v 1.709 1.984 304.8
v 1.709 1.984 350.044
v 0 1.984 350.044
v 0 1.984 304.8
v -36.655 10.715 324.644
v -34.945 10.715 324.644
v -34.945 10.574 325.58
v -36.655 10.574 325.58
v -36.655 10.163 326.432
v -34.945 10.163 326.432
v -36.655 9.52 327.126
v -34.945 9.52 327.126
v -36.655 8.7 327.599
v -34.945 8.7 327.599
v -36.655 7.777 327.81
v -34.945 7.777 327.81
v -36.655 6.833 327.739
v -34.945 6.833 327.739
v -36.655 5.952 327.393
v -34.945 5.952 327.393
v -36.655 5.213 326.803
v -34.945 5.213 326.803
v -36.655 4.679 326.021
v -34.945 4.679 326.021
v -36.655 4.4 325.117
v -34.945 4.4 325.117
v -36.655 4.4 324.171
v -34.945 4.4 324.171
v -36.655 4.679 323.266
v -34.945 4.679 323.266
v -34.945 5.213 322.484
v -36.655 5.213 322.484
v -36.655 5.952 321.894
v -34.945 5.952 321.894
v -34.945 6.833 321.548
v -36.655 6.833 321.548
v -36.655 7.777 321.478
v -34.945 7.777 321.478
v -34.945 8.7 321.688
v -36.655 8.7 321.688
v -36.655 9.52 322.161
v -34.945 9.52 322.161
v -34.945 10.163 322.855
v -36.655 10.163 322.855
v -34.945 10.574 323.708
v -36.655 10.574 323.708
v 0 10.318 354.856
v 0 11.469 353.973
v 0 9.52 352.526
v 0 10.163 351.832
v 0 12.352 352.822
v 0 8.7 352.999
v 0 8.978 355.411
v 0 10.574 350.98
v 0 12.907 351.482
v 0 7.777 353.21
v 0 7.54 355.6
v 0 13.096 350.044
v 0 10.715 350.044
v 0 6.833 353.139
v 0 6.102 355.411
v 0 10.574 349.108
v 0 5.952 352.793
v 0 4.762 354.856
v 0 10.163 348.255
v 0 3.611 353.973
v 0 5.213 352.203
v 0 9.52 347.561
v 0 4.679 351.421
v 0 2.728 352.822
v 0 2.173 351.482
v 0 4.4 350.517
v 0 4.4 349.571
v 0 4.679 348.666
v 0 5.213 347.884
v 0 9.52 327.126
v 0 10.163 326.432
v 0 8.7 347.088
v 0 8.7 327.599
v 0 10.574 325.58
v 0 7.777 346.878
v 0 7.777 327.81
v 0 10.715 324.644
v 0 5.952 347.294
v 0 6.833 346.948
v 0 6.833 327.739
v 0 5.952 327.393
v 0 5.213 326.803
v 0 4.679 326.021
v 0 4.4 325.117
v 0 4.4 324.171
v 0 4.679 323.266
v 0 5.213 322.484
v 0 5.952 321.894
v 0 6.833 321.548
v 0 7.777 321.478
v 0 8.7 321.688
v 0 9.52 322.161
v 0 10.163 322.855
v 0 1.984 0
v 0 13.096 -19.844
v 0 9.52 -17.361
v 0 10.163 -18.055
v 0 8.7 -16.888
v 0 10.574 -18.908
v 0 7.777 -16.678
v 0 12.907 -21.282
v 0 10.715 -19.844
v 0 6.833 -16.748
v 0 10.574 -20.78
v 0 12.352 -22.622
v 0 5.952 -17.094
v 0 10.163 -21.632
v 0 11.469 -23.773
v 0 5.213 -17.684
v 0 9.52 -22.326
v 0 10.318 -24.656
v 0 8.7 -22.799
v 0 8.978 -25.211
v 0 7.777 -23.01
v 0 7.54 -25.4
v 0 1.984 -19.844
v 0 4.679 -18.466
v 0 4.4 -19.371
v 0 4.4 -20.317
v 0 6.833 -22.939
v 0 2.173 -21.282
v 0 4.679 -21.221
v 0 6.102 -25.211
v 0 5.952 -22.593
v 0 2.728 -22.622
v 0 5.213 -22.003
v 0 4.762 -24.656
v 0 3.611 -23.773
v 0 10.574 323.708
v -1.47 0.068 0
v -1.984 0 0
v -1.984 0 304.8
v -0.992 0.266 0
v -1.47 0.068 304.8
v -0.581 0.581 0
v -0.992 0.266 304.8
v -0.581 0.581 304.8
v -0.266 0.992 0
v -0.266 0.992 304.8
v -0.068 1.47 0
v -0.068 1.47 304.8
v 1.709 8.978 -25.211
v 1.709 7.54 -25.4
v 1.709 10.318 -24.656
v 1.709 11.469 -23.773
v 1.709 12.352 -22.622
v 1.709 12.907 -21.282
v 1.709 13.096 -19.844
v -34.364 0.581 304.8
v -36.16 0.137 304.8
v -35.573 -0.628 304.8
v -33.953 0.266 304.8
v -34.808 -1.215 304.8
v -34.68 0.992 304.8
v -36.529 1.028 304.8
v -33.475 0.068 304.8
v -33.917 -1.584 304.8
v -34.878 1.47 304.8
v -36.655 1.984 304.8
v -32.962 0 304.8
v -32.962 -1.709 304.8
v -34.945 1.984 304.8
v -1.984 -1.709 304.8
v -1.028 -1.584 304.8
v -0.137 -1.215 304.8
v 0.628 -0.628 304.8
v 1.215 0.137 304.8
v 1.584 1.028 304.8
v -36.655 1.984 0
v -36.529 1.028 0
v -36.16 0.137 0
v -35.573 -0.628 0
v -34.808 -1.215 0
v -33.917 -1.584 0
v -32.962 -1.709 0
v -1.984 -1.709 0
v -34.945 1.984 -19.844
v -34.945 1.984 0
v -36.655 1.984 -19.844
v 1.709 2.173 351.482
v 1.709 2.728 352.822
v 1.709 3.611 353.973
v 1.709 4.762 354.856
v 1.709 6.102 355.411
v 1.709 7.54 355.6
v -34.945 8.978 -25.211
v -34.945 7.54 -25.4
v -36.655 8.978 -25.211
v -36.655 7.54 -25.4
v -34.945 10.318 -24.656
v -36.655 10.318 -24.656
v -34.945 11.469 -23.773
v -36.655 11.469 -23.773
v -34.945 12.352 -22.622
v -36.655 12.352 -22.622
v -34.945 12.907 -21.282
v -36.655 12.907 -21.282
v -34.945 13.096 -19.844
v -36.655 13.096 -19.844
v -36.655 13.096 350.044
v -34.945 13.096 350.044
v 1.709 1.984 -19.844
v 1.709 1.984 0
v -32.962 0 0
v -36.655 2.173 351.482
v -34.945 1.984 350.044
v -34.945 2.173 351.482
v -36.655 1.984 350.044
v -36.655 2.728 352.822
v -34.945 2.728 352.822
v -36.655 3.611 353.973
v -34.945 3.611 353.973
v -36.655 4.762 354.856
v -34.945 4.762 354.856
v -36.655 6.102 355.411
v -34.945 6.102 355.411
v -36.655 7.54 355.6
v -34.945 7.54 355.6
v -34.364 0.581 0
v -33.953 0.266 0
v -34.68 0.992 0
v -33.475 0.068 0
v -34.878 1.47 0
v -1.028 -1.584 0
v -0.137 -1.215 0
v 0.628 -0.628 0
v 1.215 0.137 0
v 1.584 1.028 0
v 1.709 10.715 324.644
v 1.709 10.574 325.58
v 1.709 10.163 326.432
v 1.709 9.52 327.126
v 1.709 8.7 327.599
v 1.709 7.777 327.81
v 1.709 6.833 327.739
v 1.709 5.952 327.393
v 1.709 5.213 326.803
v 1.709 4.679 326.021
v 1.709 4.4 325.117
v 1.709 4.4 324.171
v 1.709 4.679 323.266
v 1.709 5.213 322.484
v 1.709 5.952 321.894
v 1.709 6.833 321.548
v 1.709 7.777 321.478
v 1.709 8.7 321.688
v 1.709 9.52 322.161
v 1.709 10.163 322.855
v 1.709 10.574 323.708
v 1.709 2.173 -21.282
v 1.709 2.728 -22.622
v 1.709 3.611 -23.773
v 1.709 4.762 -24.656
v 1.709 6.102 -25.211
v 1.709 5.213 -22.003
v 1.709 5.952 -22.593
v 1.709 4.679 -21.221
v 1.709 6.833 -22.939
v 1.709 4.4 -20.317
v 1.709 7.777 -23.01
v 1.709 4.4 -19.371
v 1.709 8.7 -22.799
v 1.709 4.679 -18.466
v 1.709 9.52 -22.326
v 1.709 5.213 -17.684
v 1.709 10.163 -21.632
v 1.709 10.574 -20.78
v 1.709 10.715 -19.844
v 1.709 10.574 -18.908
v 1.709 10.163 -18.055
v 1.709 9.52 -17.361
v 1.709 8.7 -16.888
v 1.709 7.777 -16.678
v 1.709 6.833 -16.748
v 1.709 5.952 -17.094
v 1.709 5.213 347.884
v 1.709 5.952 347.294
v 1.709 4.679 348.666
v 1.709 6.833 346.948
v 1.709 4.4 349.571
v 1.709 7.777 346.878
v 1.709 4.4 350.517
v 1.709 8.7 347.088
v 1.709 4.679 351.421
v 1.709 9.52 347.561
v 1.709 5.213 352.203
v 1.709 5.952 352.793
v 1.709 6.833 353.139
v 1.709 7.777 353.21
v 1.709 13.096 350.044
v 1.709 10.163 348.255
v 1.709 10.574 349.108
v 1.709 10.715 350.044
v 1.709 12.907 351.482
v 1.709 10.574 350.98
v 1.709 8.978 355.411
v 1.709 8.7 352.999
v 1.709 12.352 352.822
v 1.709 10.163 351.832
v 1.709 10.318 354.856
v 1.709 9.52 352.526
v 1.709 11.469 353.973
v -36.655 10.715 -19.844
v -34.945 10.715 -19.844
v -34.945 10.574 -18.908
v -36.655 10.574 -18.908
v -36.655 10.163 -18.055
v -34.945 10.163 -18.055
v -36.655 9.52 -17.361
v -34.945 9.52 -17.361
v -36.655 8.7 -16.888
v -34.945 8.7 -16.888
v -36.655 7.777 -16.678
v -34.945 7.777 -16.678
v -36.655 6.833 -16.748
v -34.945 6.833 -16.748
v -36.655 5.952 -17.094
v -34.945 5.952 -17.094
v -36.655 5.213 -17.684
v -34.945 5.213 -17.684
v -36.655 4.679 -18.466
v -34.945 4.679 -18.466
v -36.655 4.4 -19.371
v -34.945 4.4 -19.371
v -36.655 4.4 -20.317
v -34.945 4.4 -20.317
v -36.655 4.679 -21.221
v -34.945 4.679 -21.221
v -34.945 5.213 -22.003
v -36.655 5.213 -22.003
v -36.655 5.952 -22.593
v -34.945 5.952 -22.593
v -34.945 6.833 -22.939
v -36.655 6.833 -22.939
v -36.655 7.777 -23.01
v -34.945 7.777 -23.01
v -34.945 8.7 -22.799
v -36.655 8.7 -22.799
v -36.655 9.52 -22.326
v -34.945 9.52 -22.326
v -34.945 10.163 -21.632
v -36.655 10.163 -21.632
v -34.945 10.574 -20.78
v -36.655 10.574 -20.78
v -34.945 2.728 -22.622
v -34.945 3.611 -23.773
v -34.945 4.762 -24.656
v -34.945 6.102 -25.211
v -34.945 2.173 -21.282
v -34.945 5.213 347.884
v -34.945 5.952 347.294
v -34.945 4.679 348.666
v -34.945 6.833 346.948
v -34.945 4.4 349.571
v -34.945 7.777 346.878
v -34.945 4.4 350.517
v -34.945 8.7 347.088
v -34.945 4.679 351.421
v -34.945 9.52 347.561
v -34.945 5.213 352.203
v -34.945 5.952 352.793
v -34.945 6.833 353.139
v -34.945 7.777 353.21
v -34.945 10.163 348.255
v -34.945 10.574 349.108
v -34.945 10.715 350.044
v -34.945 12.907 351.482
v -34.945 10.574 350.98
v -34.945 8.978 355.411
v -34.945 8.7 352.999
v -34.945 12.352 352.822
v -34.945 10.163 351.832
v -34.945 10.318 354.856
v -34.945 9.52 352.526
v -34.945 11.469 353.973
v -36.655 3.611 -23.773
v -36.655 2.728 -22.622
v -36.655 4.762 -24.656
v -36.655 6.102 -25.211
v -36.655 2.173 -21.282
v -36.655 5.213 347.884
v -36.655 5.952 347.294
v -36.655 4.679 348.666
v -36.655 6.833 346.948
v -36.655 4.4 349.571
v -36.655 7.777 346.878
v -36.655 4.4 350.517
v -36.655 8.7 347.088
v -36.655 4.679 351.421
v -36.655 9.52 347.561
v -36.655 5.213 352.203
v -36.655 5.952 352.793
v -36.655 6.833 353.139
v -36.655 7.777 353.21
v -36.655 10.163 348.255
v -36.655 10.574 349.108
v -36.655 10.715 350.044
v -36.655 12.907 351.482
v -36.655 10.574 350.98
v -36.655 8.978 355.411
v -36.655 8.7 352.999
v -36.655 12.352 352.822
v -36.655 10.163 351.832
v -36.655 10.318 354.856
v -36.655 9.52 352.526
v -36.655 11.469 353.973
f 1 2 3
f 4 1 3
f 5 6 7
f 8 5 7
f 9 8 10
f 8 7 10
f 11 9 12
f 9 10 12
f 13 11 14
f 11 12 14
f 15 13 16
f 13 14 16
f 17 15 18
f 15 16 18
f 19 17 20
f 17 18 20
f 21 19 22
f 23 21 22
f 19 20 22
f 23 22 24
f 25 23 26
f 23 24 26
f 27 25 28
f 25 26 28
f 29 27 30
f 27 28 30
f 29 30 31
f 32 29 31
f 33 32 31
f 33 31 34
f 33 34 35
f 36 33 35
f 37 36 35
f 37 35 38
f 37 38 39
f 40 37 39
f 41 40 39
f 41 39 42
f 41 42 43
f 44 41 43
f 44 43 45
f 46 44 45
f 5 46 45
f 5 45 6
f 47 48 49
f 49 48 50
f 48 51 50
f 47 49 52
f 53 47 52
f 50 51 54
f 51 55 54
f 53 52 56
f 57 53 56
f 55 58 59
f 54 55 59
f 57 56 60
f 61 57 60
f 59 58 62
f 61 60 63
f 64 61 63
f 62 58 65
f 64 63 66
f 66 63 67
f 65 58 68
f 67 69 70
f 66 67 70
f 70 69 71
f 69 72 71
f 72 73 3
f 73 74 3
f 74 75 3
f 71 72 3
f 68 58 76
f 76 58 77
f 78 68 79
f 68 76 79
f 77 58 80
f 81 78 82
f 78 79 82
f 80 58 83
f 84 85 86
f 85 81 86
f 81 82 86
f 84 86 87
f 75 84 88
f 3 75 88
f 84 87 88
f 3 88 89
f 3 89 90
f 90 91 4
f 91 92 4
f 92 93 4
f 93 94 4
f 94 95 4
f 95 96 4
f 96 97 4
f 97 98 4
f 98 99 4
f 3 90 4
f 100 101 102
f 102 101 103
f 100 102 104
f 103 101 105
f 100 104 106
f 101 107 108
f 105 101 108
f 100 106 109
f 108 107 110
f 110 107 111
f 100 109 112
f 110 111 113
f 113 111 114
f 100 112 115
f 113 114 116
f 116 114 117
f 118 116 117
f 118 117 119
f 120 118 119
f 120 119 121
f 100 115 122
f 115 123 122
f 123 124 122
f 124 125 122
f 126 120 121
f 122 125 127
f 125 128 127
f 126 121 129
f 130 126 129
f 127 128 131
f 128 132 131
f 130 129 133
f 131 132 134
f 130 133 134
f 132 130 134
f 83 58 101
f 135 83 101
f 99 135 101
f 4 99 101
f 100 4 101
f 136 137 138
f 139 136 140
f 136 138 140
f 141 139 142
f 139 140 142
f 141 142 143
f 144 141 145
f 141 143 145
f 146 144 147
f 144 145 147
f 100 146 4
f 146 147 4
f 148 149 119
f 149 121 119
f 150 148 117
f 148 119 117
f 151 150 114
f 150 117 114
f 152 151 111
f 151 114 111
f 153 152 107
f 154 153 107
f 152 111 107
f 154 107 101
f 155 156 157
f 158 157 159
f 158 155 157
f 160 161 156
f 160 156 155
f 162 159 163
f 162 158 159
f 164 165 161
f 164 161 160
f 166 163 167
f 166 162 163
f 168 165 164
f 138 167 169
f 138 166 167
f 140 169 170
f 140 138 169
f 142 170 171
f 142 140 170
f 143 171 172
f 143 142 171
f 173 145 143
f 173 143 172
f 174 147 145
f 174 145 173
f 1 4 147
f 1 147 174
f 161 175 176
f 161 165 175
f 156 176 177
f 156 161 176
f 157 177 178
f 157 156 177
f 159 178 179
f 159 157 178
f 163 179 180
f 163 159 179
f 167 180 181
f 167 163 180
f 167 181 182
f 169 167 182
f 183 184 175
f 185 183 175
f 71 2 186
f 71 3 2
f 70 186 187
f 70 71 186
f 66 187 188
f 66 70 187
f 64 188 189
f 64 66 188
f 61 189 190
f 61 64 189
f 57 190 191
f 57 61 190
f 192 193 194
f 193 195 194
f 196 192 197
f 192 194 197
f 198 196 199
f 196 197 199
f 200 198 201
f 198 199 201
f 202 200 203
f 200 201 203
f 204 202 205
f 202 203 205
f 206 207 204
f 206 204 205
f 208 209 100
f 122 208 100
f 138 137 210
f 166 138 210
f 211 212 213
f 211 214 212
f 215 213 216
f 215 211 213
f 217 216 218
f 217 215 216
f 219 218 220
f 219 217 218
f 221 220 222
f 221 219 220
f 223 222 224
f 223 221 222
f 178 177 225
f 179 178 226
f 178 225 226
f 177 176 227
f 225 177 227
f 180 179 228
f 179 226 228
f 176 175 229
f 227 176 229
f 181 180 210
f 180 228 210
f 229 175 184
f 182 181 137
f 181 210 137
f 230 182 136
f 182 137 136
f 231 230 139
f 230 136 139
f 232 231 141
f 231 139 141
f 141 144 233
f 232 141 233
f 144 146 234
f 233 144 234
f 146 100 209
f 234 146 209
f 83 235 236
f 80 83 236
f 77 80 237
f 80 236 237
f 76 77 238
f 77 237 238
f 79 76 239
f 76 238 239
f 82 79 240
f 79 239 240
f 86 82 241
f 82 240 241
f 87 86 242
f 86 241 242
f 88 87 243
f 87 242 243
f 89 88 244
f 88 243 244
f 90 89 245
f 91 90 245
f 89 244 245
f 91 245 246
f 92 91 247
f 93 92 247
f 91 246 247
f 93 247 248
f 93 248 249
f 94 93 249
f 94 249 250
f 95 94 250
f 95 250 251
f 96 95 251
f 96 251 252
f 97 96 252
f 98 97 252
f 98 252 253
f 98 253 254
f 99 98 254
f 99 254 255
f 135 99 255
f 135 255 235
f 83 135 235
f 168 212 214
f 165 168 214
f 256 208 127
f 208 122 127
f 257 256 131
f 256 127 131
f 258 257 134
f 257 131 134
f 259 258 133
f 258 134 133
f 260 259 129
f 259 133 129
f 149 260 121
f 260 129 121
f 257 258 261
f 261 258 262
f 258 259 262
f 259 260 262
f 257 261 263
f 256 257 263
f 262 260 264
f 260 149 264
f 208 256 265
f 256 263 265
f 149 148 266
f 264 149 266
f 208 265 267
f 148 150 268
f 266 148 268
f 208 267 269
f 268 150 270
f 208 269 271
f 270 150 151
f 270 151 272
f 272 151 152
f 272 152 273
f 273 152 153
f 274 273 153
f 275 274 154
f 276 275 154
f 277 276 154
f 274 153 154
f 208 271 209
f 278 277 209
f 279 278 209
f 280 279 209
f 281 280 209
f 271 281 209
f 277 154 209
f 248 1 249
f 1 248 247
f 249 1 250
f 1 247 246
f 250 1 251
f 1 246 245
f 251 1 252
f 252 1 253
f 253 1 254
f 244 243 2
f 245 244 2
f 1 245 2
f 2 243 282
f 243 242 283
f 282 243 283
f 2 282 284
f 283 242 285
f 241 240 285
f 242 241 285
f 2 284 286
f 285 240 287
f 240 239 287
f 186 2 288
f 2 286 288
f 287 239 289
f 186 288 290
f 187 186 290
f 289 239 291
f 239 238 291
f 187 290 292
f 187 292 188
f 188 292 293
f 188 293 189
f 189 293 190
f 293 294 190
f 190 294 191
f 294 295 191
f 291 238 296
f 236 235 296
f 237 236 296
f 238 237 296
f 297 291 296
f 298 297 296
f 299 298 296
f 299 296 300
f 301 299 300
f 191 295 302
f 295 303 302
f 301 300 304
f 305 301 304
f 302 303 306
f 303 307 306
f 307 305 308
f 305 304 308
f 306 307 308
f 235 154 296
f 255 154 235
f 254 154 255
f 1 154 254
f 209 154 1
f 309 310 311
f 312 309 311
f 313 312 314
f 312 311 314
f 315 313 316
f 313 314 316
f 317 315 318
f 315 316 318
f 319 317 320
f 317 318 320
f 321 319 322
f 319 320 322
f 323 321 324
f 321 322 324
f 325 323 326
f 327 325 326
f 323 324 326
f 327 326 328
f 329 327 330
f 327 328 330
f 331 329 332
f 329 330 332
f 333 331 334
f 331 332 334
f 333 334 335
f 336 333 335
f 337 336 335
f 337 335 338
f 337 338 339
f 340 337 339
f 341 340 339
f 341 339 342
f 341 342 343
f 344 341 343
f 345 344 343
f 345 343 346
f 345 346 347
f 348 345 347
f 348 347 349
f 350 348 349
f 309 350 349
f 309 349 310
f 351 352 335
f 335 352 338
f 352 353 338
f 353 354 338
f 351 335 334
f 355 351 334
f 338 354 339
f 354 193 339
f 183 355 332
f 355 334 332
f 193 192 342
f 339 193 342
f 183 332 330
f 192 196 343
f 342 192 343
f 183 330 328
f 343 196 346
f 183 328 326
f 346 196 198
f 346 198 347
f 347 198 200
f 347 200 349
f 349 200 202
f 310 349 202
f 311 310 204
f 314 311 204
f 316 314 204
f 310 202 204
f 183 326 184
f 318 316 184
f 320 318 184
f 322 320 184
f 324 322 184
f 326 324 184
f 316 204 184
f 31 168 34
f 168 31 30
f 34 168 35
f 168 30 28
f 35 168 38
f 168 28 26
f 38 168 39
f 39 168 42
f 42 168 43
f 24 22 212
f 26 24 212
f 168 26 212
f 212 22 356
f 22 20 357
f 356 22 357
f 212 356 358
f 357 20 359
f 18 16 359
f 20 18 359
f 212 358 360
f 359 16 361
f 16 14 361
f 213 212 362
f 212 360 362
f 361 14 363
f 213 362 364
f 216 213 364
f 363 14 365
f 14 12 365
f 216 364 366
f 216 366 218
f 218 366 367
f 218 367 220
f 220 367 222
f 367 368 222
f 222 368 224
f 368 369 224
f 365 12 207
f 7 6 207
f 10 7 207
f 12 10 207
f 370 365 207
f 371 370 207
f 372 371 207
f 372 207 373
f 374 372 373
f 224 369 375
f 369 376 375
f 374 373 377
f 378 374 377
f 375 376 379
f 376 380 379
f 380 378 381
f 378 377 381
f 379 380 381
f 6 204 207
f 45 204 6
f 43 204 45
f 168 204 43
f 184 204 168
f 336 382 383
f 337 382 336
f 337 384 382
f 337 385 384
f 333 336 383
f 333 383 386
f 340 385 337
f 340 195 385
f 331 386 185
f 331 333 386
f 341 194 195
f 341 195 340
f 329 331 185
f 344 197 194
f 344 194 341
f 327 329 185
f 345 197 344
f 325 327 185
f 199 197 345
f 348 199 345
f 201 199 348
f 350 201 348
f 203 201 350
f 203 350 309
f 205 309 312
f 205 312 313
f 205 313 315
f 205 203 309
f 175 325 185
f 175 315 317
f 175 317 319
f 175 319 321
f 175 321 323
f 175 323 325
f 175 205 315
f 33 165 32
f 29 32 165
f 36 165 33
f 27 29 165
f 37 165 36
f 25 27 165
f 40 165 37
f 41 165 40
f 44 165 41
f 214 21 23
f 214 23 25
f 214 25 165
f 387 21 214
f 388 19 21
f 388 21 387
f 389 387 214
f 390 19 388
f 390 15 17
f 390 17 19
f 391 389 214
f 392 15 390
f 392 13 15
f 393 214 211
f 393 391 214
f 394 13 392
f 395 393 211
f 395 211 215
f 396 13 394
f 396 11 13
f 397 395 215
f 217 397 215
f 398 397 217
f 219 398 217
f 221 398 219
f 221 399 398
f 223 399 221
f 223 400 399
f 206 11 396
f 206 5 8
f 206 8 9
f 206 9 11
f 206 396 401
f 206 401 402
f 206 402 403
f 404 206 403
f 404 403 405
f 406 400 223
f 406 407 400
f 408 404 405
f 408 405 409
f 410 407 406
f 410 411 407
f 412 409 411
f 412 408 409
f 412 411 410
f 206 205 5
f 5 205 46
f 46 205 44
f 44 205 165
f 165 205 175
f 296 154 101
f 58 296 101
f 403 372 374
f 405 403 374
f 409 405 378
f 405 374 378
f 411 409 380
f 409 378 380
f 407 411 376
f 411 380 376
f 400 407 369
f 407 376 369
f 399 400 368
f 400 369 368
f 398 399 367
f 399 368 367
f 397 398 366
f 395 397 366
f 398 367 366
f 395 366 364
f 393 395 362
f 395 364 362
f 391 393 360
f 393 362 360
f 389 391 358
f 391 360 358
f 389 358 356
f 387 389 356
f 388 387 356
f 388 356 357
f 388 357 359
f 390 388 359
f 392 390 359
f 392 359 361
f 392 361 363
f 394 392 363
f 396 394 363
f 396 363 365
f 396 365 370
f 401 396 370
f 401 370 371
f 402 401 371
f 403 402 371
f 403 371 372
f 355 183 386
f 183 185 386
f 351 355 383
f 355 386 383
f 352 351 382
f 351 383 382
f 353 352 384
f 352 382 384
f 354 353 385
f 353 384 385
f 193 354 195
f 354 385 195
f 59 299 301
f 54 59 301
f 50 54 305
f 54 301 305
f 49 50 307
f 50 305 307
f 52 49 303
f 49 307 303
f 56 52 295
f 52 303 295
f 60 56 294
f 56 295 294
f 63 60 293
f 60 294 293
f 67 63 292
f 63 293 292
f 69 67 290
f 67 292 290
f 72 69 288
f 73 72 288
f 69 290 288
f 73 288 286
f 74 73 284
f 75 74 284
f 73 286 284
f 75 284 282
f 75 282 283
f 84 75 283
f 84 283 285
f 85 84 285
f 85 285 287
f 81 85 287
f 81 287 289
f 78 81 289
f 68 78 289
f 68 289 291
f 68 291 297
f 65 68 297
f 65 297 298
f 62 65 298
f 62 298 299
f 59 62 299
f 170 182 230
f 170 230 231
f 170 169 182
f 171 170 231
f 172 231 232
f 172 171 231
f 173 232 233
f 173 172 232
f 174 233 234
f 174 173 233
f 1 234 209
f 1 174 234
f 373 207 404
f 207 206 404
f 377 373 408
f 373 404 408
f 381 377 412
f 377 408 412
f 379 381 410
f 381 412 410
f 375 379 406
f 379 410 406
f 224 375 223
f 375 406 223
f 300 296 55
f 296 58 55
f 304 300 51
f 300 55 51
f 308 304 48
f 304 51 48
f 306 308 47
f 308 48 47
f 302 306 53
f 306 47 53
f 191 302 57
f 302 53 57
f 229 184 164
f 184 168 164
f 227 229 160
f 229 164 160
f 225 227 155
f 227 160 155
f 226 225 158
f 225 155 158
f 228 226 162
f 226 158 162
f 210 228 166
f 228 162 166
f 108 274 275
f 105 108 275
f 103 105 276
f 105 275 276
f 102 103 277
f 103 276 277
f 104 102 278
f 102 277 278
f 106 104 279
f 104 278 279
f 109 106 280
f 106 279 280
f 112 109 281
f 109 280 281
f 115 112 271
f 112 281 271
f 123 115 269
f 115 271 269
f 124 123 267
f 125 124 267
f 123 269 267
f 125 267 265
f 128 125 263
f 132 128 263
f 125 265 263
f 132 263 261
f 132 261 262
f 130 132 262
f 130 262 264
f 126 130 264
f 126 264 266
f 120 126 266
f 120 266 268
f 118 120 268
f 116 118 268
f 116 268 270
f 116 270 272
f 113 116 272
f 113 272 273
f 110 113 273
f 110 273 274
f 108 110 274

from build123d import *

# Parameters (mm, degrees)
F1_DEPTH = 304.8
F2_R     = 3.69316
F3_R     = 1.98374
F4_W     = 1.70942
F4_H     = 50.8
F4_H_2   = 25.4
F6_DEPTH = 11.1125
F7_R     = 5.55624
F8_R     = 3.175
F9_DEPTH = 38.36416


# Not quite as in the source:
# - a fillet or chamfer is up to 0.001 mm smaller than in the source, because OpenCascade refuses the exact size


with BuildPart() as f1:
    # F0 (on Top) → F1 (new body)
    with BuildSketch(Plane.XY):
        Polygon((0, 13.09624), (0, 0), (-34.94532, 0), (-34.94532, 13.09624), (-36.65474, 13.09624), (-36.65474, -1.70942), (1.70942, -1.70942), (1.70942, 13.09624), align=None)
    extrude(amount=F1_DEPTH)

    # F2
    f2_edges = [f1.edges().sort_by_distance(p)[0] for p in [
        (1.70942, -1.70942, 152.4),
        (-36.65474, -1.70942, 152.4),
    ]]
    fillet(f2_edges, radius=F2_R)

    # F3
    f3_edges = [f1.edges().sort_by_distance(p)[0] for p in [
        (0, 0, 152.4),
        (-34.94532, 0, 152.4),
    ]]
    fillet(f3_edges, radius=F3_R)

    # F4 (on face) → F6 (join, through all)
    with BuildSketch(Plane(origin=(0, 13.09624, 0), x_dir=(-1, 0, 0), z_dir=(0, 1, 0))):
        with Locations((35.80003, 330.2)):
            Rectangle(F4_W, F4_H)
        with Locations((-0.85471, 330.2)):
            Rectangle(F4_W, F4_H)
        with Locations((-0.85471, -12.7)):
            Rectangle(F4_W, F4_H_2)
        with Locations((35.80003, -12.7)):
            Rectangle(F4_W, F4_H_2)
    extrude(amount=-F6_DEPTH)

    # F7 (radius 5.55625 in the source; OpenCascade refuses exactly that, so slightly less here)
    f7_edges = [f1.edges().sort_by_distance(p)[0] for p in [
        (-35.80003, 13.09624, -25.4),
        (0.85471, 13.09624, -25.4),
        (0.85471, 13.09624, 355.6),
        (-35.80003, 13.09624, 355.6),
        (-35.80003, 1.98374, -25.4),
        (-35.80003, 1.98374, 355.6),
        (0.85471, 1.98374, 355.6),
        (0.85471, 1.98374, -25.4),
    ]]
    fillet(f7_edges, radius=F7_R)

    # F8 (on face) → F9 (cut, through all)
    with BuildSketch(Plane.YZ.offset(1.70942)):
        with Locations((7.53999, -19.84375)):
            Circle(F8_R)
        with Locations((7.53999, 350.04375)):
            Circle(F8_R)
        with Locations((7.53999, 324.64375)):
            Circle(F8_R)
    extrude(amount=-F9_DEPTH, mode=Mode.SUBTRACT)


solid = f1.part
